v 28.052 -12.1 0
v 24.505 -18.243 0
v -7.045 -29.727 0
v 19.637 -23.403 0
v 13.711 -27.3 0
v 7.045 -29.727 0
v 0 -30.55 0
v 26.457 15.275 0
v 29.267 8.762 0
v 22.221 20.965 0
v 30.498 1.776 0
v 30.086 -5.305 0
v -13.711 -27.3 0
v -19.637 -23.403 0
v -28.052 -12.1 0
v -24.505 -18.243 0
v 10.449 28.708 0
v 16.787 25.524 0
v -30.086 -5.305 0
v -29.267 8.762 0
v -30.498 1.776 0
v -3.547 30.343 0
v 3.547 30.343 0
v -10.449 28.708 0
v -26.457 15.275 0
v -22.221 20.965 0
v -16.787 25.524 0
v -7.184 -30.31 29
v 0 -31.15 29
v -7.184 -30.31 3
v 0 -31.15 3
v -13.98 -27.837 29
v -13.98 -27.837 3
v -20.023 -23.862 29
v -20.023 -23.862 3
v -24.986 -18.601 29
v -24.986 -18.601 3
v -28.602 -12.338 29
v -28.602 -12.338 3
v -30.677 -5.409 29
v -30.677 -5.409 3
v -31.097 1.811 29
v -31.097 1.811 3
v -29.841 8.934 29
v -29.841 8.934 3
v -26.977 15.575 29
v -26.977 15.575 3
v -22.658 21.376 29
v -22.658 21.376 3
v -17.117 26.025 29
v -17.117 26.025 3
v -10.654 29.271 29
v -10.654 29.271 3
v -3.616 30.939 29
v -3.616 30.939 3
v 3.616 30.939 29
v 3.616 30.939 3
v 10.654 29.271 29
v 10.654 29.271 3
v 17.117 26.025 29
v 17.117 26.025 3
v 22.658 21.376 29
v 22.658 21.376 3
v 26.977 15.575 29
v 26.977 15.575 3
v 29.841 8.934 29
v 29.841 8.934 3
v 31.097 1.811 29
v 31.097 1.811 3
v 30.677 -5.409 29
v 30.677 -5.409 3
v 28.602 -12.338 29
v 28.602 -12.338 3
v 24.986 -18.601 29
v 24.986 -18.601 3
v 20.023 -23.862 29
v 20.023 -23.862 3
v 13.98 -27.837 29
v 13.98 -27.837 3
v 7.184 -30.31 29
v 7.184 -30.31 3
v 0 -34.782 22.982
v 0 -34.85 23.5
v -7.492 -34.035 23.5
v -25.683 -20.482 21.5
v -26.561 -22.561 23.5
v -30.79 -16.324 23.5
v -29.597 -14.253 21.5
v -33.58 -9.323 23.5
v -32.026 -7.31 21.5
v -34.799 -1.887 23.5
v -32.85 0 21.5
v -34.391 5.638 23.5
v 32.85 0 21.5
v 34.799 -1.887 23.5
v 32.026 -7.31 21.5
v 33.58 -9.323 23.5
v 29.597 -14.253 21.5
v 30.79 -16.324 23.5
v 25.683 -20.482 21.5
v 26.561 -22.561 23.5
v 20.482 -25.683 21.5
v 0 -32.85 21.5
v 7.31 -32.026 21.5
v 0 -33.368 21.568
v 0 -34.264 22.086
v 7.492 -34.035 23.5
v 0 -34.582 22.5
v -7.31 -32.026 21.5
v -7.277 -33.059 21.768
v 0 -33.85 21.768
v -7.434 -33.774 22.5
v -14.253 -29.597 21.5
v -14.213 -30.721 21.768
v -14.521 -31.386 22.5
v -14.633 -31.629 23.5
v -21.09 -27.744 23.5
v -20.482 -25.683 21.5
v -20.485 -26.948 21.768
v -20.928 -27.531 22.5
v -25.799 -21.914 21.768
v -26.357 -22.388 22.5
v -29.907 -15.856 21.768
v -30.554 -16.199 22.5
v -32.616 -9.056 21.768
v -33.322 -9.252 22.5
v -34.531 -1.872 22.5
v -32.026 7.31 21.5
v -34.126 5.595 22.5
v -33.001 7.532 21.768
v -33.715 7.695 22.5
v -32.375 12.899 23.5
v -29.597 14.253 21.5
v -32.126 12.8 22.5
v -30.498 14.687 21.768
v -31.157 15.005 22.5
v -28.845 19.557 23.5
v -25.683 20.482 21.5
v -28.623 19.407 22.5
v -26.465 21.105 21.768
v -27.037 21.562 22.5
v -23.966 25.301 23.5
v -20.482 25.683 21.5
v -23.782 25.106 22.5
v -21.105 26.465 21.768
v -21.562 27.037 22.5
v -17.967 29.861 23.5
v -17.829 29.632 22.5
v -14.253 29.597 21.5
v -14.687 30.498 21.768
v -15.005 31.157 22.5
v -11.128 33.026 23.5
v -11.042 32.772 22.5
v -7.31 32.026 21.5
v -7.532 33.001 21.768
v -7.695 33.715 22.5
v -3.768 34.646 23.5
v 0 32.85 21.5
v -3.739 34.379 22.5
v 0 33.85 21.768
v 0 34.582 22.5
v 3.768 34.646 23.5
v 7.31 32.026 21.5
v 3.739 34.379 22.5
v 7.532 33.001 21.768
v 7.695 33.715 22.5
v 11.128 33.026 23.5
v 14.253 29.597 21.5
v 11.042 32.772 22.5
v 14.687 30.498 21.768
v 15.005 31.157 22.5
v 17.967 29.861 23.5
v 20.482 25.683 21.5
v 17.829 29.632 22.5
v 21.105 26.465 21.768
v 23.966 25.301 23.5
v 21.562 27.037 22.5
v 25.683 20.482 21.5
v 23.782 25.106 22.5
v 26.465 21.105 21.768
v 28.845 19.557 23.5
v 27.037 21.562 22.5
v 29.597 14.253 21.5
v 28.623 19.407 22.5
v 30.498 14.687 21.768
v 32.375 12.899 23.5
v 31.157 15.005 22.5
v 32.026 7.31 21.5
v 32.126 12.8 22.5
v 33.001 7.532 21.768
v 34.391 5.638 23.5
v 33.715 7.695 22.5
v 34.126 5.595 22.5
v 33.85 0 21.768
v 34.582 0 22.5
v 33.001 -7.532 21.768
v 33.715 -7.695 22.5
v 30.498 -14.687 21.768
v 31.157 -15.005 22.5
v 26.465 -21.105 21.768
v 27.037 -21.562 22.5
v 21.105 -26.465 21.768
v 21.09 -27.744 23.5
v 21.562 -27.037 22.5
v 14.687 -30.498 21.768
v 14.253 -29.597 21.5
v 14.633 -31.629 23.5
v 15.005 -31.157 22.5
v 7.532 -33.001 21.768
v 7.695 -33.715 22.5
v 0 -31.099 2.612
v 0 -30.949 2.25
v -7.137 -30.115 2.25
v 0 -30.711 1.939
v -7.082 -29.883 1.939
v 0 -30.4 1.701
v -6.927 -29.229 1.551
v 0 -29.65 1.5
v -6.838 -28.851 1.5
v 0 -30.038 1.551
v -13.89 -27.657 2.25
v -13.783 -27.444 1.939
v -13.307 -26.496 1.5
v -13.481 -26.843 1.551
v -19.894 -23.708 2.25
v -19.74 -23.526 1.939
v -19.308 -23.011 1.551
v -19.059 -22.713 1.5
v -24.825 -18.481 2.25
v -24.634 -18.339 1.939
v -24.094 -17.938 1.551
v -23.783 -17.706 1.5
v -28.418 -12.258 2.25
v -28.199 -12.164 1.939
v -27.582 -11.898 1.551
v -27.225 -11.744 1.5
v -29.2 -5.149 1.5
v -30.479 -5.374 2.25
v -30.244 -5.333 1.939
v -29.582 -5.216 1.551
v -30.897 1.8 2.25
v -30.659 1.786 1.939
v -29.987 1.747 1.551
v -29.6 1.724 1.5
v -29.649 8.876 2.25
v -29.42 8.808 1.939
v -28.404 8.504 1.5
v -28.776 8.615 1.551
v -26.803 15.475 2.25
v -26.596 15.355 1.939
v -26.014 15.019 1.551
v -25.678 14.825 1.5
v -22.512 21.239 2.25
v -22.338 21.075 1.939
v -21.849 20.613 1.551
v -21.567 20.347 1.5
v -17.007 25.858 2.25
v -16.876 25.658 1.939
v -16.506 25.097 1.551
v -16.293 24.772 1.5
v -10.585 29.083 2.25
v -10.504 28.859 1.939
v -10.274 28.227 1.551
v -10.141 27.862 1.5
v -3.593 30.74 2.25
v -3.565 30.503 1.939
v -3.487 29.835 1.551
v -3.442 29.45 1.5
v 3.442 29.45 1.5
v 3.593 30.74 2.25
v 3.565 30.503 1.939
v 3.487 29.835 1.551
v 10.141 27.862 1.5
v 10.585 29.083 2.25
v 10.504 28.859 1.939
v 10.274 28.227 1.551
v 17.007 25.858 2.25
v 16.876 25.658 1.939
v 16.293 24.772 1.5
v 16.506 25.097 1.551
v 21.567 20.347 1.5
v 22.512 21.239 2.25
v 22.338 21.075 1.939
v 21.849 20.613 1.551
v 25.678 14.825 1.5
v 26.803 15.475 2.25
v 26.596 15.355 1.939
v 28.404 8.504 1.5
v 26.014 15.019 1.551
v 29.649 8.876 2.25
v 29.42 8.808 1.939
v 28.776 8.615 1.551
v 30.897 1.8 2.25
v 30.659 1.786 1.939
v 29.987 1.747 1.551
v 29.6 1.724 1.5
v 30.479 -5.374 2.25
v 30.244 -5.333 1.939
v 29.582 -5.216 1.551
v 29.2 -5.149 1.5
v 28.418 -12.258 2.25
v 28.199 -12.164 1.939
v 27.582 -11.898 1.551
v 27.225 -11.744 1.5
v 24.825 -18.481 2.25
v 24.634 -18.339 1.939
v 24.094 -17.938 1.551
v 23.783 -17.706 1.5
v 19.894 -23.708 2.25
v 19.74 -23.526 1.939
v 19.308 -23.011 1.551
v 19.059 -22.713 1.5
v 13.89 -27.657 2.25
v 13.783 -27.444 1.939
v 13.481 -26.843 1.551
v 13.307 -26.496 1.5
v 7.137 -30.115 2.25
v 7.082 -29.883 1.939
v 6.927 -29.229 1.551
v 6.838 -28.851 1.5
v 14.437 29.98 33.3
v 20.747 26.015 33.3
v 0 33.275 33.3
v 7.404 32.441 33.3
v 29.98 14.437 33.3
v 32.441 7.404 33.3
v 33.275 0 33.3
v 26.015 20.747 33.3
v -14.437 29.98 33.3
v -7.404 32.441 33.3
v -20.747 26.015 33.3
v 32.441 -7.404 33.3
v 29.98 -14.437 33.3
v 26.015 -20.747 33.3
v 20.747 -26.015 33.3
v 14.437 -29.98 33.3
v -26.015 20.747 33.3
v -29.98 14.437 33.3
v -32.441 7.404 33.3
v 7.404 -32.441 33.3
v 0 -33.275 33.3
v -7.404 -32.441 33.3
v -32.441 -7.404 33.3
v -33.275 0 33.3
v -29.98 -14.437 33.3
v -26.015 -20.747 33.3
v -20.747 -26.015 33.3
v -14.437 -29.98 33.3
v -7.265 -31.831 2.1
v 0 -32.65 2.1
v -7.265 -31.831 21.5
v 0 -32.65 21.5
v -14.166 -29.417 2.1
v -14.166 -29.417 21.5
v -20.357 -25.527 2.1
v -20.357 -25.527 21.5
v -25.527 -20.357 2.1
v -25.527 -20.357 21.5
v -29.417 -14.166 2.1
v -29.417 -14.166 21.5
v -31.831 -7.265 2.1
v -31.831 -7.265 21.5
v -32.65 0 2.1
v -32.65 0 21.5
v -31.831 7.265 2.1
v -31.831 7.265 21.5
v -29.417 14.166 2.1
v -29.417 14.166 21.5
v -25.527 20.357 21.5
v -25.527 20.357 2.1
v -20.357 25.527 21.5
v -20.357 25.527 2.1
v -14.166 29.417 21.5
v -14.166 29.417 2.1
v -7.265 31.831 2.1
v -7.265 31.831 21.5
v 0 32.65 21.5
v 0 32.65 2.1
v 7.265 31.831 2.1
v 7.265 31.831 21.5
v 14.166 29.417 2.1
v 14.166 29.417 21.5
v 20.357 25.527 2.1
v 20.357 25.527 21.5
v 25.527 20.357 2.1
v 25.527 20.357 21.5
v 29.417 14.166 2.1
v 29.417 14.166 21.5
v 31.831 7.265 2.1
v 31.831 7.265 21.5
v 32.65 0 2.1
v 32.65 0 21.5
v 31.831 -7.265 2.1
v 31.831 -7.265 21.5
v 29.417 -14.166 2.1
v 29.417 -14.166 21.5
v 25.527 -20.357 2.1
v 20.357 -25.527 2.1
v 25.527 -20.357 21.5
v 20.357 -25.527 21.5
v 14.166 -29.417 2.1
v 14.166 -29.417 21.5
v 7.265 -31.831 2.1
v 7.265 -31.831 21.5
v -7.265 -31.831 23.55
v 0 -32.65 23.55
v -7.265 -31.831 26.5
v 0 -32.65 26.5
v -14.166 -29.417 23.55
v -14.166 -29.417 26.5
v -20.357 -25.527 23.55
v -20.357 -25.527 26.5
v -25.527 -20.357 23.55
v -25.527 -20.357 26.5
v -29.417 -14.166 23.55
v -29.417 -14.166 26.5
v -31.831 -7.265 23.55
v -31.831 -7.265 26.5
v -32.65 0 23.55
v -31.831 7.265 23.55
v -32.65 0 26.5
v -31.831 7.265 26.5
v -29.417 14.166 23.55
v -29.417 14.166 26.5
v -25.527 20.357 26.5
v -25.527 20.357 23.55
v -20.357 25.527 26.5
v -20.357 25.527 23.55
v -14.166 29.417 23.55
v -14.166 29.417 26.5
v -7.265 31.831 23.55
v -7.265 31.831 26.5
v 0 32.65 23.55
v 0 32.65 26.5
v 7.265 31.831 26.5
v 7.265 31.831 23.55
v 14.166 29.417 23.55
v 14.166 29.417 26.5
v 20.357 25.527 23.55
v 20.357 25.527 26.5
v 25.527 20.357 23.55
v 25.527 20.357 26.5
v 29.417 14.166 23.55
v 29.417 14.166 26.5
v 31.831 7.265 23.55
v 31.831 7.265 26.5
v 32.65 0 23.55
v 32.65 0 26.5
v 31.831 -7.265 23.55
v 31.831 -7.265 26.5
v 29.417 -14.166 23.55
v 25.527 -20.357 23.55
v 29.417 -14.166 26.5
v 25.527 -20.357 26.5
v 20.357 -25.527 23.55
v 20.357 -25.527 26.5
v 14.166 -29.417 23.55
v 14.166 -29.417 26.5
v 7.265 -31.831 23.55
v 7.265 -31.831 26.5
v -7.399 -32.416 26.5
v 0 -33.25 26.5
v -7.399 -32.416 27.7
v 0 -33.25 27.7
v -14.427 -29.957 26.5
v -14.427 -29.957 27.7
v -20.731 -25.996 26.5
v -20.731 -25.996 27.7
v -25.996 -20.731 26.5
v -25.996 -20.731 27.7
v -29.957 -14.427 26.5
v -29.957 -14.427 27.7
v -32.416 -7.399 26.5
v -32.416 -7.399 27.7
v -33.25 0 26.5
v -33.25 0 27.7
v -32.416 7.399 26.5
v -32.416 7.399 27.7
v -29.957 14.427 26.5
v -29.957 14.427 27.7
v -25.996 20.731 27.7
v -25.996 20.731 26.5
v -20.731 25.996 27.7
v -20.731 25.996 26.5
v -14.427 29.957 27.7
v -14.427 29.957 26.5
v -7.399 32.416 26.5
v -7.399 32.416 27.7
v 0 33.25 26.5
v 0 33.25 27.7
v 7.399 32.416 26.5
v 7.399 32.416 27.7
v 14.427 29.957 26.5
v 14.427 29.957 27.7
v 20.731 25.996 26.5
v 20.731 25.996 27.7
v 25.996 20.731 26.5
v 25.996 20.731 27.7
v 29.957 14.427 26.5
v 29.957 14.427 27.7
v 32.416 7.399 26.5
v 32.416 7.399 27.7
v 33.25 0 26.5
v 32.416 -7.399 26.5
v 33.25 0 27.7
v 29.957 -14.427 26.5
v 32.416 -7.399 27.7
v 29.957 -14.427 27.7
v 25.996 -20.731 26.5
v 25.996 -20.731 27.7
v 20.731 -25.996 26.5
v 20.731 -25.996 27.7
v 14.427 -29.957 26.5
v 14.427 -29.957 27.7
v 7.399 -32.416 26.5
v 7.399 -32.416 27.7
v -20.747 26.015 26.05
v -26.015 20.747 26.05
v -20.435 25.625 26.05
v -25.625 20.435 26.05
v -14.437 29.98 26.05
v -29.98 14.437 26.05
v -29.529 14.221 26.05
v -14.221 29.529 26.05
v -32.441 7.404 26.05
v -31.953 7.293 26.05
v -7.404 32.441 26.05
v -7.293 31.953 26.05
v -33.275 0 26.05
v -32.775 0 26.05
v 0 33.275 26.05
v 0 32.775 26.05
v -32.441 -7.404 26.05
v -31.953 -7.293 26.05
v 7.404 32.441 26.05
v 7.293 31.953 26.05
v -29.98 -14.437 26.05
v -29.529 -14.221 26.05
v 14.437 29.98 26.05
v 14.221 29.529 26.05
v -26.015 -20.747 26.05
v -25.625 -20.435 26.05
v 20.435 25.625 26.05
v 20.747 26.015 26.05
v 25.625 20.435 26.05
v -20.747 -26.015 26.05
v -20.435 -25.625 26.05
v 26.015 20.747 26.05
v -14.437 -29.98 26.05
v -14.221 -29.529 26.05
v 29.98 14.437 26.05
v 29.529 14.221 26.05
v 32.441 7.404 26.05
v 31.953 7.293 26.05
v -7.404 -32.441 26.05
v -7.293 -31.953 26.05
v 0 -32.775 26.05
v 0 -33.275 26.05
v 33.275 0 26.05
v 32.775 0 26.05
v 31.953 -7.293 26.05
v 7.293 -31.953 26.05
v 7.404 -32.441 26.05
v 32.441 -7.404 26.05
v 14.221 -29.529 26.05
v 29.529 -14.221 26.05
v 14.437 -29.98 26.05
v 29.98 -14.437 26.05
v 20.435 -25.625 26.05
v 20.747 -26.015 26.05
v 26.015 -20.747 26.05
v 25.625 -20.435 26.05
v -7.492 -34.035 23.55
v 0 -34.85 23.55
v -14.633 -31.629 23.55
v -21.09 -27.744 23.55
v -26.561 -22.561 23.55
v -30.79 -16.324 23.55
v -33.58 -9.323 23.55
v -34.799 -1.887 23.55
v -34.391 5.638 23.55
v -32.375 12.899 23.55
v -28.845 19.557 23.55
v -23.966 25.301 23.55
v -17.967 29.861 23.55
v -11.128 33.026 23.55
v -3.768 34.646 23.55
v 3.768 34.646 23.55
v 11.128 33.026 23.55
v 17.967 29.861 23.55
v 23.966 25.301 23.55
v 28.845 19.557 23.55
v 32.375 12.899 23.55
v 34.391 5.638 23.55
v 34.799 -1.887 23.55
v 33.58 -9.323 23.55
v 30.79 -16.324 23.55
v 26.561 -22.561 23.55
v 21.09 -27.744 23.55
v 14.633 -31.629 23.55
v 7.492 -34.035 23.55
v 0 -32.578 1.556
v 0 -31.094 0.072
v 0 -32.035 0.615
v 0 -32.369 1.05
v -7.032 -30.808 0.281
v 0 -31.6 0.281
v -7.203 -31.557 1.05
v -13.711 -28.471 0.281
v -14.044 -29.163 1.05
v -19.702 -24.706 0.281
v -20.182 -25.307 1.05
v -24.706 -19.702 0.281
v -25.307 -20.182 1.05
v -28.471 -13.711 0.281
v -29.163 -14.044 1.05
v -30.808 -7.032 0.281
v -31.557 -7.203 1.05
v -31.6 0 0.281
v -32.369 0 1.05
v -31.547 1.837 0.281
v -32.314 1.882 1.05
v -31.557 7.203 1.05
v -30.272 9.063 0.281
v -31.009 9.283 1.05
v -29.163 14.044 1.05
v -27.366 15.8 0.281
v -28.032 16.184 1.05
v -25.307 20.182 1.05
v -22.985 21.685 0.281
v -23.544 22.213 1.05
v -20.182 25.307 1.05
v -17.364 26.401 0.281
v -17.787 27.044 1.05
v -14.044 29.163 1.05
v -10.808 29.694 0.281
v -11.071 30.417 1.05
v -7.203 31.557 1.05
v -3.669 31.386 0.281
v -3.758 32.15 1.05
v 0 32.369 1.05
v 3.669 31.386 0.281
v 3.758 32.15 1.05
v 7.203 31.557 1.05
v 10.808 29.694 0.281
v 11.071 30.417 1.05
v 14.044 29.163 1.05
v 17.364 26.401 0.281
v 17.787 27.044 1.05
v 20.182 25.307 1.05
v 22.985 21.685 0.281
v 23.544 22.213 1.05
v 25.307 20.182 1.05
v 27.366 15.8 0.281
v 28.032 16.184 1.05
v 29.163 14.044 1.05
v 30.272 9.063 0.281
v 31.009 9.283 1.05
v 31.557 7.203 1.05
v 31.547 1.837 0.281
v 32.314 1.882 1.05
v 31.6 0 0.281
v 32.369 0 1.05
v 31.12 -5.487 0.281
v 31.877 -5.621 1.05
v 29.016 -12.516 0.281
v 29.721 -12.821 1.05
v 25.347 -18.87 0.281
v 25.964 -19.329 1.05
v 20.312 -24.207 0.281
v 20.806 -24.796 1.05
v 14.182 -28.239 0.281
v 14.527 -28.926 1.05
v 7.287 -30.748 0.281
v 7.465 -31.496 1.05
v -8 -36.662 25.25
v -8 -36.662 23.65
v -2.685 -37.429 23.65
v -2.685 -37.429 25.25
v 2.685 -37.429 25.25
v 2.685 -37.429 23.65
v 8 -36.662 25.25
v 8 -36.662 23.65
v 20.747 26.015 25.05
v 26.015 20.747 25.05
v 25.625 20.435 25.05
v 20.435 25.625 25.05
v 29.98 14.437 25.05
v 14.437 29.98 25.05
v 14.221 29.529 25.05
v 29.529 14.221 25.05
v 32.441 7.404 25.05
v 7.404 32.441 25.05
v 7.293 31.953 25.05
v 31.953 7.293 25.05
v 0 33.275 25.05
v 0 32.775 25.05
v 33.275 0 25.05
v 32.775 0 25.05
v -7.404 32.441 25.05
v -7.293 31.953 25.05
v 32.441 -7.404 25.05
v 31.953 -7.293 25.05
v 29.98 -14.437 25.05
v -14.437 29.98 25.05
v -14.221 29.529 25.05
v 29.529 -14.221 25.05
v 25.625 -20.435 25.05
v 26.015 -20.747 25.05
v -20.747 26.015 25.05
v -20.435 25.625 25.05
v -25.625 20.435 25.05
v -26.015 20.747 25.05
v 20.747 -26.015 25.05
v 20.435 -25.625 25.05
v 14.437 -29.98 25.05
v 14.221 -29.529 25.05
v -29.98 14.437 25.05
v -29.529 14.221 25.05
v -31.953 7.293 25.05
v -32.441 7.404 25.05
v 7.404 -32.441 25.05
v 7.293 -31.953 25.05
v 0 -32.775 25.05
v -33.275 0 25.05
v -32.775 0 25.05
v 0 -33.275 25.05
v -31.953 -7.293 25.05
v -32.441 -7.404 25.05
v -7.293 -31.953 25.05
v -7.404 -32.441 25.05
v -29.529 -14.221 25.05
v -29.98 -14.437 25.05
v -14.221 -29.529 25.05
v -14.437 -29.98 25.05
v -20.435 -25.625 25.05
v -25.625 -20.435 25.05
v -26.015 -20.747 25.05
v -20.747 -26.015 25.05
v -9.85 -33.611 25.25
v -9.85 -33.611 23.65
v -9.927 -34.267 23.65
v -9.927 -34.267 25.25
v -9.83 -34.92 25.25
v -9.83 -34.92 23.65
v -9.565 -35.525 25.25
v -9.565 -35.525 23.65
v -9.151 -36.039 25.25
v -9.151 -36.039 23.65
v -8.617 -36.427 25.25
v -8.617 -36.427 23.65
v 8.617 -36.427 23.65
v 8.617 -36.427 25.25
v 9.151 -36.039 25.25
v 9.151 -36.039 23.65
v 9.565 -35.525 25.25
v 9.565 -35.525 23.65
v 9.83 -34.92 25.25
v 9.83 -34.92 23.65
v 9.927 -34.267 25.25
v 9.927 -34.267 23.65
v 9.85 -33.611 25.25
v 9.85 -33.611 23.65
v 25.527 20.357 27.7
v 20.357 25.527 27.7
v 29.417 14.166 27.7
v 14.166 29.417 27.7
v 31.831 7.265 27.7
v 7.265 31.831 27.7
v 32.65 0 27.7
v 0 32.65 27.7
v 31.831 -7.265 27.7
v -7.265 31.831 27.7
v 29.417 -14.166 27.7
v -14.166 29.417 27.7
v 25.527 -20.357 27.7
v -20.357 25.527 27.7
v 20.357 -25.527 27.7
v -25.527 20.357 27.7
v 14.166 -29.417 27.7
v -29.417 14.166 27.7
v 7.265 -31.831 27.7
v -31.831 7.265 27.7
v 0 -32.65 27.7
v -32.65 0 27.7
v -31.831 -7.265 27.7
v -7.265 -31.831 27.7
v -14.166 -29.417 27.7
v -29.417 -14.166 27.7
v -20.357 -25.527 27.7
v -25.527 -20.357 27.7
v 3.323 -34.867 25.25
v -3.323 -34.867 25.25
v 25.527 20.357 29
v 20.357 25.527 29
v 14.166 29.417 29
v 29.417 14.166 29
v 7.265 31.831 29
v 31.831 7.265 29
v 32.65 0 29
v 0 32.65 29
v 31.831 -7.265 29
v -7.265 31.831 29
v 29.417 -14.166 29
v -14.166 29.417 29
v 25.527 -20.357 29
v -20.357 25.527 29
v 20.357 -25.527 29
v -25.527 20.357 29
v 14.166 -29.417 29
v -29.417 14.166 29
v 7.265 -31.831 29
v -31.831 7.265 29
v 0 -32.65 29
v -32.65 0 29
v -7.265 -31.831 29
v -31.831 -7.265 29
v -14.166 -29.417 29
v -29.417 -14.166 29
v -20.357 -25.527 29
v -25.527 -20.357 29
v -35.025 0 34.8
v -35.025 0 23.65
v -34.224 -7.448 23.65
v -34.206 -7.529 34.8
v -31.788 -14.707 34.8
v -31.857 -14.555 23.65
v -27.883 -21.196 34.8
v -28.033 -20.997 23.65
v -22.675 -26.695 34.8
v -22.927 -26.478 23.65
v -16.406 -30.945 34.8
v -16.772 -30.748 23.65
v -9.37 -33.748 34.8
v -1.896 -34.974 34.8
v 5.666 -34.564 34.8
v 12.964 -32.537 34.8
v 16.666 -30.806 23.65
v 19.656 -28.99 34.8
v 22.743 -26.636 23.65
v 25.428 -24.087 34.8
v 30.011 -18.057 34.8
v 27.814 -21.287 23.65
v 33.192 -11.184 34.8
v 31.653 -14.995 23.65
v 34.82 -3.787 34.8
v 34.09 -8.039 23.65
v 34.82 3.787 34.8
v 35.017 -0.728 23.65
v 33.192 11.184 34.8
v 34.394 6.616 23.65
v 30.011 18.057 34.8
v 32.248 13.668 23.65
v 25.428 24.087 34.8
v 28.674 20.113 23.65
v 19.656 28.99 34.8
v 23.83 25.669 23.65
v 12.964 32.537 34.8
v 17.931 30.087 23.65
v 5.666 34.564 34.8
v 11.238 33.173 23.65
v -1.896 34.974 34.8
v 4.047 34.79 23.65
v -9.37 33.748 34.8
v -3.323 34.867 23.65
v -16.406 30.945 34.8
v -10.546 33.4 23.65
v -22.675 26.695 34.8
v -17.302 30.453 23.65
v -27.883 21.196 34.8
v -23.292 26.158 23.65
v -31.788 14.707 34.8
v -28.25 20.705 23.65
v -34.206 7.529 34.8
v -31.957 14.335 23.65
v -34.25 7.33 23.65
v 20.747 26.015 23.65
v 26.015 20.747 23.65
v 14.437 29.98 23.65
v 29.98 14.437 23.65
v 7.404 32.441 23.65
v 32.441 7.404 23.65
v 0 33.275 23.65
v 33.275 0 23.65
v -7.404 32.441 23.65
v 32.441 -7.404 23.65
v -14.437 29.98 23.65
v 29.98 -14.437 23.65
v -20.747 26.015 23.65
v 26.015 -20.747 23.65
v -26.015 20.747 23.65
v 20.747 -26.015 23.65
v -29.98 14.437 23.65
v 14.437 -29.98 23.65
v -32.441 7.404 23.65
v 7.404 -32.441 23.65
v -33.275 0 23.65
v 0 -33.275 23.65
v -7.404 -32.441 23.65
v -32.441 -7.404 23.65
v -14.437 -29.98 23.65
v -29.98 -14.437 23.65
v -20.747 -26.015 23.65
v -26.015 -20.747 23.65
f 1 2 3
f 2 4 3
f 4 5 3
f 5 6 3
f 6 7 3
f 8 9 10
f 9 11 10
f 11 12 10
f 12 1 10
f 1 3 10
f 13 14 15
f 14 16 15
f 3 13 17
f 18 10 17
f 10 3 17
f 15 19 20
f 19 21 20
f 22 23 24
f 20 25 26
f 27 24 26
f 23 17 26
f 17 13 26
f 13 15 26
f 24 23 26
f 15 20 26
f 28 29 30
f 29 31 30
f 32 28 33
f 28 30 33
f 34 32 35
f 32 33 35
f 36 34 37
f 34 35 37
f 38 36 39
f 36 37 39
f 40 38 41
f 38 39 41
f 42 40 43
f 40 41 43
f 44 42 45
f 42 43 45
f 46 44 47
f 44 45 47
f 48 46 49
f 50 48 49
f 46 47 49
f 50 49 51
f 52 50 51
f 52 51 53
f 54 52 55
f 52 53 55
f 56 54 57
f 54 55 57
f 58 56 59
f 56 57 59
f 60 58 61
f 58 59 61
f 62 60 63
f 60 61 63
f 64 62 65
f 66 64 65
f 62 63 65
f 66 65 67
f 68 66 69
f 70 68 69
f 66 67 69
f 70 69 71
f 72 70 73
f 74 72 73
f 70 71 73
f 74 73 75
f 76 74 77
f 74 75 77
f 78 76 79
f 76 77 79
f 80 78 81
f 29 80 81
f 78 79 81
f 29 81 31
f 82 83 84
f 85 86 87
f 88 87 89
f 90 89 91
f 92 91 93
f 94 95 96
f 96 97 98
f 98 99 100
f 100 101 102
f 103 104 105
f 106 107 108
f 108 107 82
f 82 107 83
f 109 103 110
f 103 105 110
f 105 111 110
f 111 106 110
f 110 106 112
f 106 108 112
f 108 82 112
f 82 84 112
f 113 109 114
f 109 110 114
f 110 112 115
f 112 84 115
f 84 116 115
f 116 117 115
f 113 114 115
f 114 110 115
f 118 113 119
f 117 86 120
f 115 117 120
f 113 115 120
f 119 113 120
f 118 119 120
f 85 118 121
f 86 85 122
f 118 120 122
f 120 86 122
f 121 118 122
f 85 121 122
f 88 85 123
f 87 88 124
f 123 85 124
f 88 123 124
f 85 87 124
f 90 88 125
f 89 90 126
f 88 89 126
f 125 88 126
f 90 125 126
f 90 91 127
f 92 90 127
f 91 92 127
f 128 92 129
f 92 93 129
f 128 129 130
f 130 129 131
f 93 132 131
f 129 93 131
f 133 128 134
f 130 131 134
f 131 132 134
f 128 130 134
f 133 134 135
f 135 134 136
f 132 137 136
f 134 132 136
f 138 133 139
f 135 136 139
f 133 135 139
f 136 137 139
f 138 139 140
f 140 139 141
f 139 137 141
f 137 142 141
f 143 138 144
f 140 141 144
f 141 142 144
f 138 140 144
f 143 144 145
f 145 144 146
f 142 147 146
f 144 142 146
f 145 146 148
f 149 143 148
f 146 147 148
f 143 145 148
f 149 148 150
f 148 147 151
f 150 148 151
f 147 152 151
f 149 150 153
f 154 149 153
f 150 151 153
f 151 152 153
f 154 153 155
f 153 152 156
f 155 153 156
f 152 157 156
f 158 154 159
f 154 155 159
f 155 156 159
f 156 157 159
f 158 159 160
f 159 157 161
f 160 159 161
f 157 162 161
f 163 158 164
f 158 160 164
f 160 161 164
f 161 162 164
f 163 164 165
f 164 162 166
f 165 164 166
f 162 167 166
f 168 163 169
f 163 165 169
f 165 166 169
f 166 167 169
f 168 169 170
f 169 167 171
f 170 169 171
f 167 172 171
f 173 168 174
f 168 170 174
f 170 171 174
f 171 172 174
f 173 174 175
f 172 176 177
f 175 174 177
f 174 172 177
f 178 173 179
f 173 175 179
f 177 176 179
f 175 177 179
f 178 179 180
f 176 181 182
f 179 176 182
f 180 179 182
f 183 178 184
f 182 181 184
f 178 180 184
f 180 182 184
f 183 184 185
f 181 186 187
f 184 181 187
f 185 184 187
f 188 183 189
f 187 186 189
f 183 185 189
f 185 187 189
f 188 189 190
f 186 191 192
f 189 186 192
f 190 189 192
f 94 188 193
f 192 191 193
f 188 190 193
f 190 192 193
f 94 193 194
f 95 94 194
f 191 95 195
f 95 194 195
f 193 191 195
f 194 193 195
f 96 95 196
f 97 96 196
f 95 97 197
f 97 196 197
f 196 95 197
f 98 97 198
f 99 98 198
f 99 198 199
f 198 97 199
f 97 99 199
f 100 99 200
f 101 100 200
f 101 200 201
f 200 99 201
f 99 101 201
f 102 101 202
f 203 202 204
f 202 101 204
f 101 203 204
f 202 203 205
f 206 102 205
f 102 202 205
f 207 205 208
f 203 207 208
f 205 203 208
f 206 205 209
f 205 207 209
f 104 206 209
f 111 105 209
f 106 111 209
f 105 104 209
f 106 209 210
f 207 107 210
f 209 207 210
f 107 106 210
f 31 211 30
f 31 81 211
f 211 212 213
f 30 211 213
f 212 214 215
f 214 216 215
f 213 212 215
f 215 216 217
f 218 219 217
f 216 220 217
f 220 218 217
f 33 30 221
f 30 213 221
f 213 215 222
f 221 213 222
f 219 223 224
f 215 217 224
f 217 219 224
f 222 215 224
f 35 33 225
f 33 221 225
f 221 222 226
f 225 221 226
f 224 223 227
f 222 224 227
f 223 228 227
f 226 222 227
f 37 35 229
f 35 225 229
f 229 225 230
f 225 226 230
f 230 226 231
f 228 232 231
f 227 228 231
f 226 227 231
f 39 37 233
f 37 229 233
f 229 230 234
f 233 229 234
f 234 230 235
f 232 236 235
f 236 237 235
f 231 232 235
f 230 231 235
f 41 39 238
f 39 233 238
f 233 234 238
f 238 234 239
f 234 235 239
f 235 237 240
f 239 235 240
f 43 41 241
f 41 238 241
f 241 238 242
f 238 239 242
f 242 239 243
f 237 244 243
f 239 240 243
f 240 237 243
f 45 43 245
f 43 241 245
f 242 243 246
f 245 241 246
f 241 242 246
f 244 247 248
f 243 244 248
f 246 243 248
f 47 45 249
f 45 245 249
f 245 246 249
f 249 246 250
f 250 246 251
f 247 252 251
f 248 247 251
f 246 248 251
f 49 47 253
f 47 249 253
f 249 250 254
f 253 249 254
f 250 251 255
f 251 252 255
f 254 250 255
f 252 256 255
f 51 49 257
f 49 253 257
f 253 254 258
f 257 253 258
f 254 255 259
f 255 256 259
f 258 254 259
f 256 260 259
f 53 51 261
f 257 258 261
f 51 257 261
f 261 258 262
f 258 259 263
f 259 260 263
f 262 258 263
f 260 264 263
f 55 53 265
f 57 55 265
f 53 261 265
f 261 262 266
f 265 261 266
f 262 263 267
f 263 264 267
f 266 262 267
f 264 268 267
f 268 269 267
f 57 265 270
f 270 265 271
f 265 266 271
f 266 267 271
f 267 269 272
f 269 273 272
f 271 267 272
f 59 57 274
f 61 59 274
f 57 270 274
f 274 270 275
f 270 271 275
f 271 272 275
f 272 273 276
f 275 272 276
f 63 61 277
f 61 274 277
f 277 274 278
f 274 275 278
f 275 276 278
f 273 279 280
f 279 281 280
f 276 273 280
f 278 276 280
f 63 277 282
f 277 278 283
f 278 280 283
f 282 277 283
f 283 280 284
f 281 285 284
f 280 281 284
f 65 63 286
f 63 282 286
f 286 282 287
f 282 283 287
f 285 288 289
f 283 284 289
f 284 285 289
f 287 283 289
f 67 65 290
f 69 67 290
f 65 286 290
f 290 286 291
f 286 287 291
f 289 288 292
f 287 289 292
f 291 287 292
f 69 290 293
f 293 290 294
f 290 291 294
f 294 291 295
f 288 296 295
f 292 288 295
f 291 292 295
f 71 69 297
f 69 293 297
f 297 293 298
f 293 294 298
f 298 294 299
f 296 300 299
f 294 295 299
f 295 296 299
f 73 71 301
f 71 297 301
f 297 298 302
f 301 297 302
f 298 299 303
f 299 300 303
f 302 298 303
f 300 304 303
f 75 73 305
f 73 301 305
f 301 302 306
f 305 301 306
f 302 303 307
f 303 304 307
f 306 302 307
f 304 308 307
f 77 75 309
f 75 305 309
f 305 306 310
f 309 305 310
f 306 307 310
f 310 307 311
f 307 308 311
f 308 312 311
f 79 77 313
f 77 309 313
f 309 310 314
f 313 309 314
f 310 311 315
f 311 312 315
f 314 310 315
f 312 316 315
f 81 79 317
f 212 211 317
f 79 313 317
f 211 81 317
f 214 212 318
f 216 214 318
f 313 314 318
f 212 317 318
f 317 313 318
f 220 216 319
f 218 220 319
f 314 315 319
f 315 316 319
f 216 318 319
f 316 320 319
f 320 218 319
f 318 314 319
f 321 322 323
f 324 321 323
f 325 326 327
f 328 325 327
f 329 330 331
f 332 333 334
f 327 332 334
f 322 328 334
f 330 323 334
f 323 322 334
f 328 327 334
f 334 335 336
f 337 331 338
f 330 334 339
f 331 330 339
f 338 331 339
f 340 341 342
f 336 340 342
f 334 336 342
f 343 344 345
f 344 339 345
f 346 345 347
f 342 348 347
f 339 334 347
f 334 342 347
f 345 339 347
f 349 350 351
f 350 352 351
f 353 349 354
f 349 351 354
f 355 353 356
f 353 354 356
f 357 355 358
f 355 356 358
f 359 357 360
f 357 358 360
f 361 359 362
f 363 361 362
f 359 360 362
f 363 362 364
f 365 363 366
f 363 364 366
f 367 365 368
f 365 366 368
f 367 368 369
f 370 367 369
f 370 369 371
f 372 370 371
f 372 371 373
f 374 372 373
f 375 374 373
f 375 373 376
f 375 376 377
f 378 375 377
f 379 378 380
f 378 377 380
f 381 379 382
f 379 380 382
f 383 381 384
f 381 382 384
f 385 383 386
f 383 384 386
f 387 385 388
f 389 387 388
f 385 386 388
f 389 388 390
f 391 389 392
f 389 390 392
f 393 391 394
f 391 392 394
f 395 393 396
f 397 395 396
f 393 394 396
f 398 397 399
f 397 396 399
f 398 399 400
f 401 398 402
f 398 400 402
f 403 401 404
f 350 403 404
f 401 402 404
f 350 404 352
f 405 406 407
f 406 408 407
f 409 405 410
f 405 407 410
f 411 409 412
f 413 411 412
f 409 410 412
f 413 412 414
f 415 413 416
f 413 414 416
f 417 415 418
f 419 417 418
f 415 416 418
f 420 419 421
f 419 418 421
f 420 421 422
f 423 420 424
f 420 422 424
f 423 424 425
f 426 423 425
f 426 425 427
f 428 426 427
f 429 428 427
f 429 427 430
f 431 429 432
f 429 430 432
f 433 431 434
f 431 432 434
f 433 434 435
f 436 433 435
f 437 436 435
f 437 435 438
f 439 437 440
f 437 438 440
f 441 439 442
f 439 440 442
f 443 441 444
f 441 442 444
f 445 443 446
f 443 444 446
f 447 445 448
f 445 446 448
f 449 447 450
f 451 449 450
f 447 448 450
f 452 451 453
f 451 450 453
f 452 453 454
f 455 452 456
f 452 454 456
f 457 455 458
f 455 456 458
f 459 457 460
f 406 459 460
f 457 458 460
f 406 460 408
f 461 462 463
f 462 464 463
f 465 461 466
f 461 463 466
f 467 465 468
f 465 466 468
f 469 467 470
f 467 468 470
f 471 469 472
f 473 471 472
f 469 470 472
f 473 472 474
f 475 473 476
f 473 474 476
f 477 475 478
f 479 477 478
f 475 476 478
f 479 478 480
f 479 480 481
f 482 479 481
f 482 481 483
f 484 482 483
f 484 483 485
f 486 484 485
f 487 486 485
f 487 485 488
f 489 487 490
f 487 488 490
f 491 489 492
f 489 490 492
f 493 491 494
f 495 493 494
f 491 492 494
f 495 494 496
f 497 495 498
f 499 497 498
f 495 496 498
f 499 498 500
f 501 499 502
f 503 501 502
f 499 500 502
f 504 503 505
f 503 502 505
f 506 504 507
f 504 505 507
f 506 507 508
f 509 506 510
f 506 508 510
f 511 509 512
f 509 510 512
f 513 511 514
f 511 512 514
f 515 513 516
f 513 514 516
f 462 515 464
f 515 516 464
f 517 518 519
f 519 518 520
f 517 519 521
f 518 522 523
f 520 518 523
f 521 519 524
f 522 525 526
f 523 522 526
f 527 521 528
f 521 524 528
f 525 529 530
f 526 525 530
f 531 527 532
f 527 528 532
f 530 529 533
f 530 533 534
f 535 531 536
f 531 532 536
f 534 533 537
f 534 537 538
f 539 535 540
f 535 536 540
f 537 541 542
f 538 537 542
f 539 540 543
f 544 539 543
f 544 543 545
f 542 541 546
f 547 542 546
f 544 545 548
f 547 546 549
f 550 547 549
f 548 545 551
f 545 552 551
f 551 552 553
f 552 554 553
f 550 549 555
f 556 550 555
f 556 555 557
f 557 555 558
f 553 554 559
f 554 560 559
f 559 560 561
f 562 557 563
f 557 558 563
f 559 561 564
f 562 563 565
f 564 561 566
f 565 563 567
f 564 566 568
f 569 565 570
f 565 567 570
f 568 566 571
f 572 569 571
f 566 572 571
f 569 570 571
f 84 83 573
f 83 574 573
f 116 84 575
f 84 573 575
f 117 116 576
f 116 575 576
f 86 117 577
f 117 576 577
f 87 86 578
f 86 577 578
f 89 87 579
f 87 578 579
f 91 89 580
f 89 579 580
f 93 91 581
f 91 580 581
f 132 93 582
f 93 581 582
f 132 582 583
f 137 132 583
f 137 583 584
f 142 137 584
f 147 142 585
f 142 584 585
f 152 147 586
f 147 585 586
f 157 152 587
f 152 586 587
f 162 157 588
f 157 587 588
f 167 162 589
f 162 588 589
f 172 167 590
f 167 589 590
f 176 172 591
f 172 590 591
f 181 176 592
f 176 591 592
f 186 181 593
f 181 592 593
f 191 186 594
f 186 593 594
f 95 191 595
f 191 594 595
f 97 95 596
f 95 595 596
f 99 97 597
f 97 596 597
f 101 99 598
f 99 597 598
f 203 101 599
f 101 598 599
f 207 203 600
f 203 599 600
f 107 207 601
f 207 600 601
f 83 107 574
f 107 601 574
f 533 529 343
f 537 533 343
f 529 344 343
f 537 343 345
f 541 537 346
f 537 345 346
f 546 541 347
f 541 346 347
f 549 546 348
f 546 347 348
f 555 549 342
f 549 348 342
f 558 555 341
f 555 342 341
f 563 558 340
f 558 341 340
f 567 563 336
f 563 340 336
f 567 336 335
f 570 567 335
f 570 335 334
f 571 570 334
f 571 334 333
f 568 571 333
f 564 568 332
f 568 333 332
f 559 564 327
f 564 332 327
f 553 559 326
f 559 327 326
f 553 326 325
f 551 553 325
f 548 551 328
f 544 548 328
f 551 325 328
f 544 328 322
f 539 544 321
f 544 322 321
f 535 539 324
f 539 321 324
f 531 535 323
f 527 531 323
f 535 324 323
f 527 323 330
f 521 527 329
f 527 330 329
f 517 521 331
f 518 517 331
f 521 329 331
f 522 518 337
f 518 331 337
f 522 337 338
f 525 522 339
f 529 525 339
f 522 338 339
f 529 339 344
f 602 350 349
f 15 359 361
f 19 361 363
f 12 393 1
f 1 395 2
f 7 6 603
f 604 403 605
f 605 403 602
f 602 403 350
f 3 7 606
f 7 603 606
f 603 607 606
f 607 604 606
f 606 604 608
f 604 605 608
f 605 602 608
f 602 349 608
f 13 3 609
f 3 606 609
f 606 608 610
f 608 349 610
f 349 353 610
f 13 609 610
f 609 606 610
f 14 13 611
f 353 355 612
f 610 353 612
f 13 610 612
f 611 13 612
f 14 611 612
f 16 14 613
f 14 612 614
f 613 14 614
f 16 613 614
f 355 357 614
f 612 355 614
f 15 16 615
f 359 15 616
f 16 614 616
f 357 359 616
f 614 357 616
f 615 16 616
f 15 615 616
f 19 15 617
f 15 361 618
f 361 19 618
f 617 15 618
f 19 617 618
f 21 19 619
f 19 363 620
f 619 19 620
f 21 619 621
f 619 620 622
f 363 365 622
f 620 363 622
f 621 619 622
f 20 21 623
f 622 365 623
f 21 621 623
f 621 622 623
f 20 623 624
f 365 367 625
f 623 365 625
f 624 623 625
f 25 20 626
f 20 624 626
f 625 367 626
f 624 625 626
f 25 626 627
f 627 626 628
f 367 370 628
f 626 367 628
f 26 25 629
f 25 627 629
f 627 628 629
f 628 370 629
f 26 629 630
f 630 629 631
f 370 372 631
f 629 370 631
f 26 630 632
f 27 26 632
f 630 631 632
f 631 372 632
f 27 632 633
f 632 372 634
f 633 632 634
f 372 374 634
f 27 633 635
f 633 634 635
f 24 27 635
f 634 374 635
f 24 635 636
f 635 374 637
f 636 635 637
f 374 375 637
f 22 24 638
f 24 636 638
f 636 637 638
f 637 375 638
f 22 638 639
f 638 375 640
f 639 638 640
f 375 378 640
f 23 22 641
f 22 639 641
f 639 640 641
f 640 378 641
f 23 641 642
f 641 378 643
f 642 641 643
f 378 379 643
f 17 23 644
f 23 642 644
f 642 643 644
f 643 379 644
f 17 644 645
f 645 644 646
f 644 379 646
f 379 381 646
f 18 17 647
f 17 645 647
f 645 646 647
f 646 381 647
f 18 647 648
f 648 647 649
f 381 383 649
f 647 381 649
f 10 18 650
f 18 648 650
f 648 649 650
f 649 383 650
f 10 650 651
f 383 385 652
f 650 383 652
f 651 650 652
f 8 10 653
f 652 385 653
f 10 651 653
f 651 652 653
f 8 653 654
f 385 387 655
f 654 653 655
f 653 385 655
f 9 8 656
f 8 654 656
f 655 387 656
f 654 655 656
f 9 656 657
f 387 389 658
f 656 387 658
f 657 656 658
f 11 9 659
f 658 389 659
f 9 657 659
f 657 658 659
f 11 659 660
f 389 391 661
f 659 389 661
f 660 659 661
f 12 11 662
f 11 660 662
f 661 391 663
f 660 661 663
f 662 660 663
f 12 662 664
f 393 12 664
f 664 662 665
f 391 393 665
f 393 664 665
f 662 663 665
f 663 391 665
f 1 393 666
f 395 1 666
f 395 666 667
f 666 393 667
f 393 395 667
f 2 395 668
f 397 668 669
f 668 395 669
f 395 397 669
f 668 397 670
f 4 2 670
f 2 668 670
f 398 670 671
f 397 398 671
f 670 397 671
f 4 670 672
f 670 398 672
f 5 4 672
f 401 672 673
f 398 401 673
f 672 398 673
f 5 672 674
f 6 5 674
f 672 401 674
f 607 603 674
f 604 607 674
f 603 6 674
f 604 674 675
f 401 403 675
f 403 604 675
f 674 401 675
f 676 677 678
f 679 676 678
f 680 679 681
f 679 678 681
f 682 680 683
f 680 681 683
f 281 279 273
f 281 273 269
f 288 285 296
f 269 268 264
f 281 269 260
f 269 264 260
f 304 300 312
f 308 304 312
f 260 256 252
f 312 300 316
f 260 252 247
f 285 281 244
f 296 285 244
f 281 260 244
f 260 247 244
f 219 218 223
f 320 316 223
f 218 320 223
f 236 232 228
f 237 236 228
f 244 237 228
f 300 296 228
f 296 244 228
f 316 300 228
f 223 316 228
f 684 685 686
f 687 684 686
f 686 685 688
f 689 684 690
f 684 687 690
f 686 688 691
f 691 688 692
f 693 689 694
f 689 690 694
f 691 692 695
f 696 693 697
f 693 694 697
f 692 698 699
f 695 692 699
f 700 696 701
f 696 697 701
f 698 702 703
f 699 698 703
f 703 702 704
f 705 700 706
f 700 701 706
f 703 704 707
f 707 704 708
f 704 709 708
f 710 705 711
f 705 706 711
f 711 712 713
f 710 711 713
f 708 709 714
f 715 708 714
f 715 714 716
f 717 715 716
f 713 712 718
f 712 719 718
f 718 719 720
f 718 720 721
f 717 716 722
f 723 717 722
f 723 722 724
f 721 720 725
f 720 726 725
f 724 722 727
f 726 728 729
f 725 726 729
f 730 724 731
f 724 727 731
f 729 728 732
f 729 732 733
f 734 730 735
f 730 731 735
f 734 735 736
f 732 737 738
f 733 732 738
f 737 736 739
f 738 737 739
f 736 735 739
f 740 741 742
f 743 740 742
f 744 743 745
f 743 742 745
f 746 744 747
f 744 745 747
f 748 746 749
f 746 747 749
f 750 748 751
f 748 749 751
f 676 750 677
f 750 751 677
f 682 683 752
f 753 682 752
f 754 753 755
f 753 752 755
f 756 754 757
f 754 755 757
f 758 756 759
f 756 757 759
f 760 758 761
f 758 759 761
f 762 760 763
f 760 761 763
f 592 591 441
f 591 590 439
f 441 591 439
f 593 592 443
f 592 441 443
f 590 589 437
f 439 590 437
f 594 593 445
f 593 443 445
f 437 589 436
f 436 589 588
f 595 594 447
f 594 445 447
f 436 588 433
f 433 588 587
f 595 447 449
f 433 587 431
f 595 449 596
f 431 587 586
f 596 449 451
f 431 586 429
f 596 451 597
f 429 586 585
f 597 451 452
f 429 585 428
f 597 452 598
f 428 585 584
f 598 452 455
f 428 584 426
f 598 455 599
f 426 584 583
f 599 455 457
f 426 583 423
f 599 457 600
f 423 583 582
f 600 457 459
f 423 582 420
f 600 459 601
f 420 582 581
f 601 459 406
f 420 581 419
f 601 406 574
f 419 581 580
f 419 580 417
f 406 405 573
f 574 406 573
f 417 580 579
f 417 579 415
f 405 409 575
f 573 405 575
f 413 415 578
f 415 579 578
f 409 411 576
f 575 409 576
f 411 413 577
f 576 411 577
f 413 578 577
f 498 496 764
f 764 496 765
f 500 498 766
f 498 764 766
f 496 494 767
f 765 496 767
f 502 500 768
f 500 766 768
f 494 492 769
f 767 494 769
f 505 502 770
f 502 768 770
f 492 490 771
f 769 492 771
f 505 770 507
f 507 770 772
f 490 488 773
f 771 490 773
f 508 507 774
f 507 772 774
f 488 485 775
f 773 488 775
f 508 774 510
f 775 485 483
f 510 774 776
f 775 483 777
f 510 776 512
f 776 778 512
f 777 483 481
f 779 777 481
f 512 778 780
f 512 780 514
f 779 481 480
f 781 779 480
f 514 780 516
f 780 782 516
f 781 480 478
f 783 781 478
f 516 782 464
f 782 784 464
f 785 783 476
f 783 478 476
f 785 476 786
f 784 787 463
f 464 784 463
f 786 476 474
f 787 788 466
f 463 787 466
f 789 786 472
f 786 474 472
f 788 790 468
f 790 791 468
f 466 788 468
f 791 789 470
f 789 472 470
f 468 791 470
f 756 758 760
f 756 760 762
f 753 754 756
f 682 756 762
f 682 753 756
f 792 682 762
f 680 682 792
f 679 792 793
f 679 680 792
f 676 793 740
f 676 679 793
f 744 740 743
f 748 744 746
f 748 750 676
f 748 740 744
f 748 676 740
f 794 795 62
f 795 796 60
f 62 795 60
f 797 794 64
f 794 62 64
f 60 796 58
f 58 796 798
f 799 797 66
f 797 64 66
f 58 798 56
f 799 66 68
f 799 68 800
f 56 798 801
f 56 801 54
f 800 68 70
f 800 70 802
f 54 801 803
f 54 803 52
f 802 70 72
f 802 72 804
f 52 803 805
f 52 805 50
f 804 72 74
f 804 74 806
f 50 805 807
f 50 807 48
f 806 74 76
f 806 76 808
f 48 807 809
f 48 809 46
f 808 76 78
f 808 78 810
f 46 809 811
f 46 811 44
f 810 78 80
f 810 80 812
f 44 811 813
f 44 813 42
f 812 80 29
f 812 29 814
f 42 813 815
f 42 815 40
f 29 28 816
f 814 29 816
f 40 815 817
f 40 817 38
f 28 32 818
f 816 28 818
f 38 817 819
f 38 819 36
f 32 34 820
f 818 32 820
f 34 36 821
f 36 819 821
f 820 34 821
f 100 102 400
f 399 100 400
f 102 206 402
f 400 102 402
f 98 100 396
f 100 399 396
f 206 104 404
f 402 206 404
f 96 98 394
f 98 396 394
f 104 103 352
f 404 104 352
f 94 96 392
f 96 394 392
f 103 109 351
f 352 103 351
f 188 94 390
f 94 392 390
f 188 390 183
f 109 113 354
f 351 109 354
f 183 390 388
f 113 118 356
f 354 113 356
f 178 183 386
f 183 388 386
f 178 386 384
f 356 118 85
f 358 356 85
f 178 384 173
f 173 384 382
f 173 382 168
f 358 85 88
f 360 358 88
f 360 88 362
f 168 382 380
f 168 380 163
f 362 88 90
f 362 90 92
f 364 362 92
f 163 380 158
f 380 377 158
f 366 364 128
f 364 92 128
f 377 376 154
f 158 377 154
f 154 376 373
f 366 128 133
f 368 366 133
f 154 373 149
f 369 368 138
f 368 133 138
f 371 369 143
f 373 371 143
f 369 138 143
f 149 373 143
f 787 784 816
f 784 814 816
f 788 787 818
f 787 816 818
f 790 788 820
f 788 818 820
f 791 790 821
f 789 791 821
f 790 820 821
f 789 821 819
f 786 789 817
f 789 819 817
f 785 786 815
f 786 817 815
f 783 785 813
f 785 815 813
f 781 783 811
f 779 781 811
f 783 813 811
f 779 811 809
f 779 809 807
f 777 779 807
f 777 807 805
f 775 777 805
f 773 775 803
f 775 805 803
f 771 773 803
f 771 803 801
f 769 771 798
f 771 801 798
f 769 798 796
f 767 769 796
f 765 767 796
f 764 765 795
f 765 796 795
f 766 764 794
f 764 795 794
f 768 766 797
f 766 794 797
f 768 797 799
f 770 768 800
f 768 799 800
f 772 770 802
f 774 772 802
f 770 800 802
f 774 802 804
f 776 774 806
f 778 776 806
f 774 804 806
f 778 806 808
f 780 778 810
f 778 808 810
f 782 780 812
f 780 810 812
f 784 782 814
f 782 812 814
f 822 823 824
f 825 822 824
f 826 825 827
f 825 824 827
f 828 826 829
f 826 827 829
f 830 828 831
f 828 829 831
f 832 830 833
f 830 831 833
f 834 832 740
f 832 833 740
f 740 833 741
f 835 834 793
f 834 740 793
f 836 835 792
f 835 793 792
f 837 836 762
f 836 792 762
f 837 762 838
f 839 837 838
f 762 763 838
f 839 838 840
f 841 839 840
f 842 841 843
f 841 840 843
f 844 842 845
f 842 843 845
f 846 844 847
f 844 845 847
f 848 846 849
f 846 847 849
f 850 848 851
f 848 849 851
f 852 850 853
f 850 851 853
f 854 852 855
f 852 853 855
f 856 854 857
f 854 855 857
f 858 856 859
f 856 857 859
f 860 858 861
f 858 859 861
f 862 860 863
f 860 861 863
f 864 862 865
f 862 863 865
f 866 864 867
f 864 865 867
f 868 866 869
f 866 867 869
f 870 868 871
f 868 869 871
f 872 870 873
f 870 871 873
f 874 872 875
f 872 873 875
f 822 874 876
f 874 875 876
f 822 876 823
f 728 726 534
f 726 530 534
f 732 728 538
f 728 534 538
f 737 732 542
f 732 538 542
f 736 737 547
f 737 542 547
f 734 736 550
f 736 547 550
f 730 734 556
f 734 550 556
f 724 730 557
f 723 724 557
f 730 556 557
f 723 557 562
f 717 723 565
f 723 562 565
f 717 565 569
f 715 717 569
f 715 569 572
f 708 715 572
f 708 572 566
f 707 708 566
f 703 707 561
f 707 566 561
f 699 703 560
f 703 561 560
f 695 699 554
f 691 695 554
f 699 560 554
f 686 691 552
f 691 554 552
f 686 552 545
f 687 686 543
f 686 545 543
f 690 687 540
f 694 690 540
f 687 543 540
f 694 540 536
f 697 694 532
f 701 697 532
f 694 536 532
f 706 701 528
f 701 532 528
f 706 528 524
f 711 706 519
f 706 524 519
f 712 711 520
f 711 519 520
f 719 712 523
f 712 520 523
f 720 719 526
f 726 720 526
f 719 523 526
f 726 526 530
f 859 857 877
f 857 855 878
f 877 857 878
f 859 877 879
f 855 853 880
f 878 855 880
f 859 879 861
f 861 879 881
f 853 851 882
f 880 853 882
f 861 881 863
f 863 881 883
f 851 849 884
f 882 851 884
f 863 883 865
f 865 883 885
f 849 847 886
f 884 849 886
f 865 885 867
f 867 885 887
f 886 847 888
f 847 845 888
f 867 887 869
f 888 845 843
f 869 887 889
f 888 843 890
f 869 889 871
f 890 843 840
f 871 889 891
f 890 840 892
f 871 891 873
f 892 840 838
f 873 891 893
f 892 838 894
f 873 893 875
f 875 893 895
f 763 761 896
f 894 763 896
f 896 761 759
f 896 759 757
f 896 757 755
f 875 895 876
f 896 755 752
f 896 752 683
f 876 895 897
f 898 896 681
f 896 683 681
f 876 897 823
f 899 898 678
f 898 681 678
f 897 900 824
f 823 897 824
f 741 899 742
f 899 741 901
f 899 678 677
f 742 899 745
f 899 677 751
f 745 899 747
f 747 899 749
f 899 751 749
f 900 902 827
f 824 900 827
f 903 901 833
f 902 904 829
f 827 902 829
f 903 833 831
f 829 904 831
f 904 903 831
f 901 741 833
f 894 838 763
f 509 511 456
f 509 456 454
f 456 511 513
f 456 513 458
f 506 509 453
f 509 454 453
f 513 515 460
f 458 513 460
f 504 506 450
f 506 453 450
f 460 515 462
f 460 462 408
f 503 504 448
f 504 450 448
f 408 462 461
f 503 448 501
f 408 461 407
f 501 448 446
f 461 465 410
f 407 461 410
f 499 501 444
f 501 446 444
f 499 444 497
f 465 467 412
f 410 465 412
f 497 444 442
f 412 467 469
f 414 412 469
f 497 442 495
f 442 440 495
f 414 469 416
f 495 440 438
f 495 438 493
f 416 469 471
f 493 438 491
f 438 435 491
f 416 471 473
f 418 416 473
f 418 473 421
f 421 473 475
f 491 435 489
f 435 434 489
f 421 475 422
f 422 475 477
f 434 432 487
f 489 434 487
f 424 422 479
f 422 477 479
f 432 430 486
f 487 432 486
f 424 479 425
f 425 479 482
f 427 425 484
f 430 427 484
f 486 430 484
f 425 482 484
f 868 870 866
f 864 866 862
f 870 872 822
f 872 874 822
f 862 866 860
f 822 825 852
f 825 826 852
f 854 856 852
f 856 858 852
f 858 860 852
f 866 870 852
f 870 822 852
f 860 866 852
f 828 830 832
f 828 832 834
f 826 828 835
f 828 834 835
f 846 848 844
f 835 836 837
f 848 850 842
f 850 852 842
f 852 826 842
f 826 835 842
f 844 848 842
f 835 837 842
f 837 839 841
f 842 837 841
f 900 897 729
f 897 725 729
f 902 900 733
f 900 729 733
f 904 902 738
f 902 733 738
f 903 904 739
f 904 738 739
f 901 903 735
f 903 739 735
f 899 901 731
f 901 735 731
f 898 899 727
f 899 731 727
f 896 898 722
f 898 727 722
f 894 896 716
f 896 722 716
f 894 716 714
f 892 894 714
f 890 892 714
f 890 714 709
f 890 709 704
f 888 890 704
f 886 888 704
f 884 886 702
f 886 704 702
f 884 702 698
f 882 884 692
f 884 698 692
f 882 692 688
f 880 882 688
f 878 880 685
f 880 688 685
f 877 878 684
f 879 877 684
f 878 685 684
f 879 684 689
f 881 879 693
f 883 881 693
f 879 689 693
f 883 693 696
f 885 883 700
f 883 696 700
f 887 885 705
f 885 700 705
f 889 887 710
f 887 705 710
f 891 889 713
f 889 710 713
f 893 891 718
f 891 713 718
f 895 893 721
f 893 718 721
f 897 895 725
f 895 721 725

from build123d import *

# Parameters (mm, degrees)
BOSS_EXTRUDE3_DEPTH = 1.6


with BuildPart() as part:
    # Sketch4 → Revolve1 (revolve)
    with BuildSketch(Plane.YZ):
        with BuildLine():
            Line((0, 0), (30.55, 0))
            ThreePointArc((30.55, 0), (32.03492424, 0.61507576), (32.65, 2.1))
            Line((32.65, 2.1), (32.65, 21.5))
            Line((32.65, 21.5), (32.85, 21.5))
            ThreePointArc((32.85, 21.5), (34.264213562, 22.085786438), (34.85, 23.5))
            Line((34.85, 23.5), (34.85, 23.55))
            Line((34.85, 23.55), (32.65, 23.55))
            Line((32.65, 23.55), (32.65, 26.5))
            Line((32.65, 26.5), (33.25, 26.5))
            Line((33.25, 26.5), (33.25, 27.7))
            Line((33.25, 27.7), (32.65, 27.7))
            Line((32.65, 27.7), (32.65, 29))
            Line((32.65, 29), (31.15, 29))
            Line((31.15, 29), (31.15, 3))
            ThreePointArc((31.15, 3), (30.710660172, 1.939339828), (29.65, 1.5))
            Line((29.65, 1.5), (0, 1.5))
            Line((0, 1.5), (0, 0))
        make_face()
    revolve(axis=Axis((0, 0, 1.5), (0, 0, -1)))


with BuildPart() as body_2:
    # Sketch6 → Revolve2 (revolve)
    with BuildSketch(Plane.YZ):
        Polygon((0, 33.3), (0, 34.8), (35.025, 34.8), (35.025, 23.65), (33.275, 23.65), (33.275, 25.05), (32.775, 25.05), (32.775, 26.05), (33.275, 26.05), (33.275, 33.3), align=None)
    revolve(axis=Axis((0, 0, 33.3), (0, 0, 1)))

    # Sketch7 → Boss-Extrude3 (add)
    with BuildSketch(Plane(origin=(0, 0, 23.65), x_dir=(1, 0, 0), z_dir=(0, 0, -1))):
        with BuildLine():
            ThreePointArc((9.85, 33.611428488), (0, 35.025), (-9.85, 33.611428488))
            ThreePointArc((-9.85, 33.611428488), (-9.56498134, 35.524945793), (-8, 36.662318871))
            ThreePointArc((-8, 36.662318871), (0, 37.525), (8, 36.662318871))
            ThreePointArc((8, 36.662318871), (9.56498134, 35.524945793), (9.85, 33.611428488))
        make_face()
    extrude(amount=-BOSS_EXTRUDE3_DEPTH)


solid = Compound([part.part, body_2.part])
